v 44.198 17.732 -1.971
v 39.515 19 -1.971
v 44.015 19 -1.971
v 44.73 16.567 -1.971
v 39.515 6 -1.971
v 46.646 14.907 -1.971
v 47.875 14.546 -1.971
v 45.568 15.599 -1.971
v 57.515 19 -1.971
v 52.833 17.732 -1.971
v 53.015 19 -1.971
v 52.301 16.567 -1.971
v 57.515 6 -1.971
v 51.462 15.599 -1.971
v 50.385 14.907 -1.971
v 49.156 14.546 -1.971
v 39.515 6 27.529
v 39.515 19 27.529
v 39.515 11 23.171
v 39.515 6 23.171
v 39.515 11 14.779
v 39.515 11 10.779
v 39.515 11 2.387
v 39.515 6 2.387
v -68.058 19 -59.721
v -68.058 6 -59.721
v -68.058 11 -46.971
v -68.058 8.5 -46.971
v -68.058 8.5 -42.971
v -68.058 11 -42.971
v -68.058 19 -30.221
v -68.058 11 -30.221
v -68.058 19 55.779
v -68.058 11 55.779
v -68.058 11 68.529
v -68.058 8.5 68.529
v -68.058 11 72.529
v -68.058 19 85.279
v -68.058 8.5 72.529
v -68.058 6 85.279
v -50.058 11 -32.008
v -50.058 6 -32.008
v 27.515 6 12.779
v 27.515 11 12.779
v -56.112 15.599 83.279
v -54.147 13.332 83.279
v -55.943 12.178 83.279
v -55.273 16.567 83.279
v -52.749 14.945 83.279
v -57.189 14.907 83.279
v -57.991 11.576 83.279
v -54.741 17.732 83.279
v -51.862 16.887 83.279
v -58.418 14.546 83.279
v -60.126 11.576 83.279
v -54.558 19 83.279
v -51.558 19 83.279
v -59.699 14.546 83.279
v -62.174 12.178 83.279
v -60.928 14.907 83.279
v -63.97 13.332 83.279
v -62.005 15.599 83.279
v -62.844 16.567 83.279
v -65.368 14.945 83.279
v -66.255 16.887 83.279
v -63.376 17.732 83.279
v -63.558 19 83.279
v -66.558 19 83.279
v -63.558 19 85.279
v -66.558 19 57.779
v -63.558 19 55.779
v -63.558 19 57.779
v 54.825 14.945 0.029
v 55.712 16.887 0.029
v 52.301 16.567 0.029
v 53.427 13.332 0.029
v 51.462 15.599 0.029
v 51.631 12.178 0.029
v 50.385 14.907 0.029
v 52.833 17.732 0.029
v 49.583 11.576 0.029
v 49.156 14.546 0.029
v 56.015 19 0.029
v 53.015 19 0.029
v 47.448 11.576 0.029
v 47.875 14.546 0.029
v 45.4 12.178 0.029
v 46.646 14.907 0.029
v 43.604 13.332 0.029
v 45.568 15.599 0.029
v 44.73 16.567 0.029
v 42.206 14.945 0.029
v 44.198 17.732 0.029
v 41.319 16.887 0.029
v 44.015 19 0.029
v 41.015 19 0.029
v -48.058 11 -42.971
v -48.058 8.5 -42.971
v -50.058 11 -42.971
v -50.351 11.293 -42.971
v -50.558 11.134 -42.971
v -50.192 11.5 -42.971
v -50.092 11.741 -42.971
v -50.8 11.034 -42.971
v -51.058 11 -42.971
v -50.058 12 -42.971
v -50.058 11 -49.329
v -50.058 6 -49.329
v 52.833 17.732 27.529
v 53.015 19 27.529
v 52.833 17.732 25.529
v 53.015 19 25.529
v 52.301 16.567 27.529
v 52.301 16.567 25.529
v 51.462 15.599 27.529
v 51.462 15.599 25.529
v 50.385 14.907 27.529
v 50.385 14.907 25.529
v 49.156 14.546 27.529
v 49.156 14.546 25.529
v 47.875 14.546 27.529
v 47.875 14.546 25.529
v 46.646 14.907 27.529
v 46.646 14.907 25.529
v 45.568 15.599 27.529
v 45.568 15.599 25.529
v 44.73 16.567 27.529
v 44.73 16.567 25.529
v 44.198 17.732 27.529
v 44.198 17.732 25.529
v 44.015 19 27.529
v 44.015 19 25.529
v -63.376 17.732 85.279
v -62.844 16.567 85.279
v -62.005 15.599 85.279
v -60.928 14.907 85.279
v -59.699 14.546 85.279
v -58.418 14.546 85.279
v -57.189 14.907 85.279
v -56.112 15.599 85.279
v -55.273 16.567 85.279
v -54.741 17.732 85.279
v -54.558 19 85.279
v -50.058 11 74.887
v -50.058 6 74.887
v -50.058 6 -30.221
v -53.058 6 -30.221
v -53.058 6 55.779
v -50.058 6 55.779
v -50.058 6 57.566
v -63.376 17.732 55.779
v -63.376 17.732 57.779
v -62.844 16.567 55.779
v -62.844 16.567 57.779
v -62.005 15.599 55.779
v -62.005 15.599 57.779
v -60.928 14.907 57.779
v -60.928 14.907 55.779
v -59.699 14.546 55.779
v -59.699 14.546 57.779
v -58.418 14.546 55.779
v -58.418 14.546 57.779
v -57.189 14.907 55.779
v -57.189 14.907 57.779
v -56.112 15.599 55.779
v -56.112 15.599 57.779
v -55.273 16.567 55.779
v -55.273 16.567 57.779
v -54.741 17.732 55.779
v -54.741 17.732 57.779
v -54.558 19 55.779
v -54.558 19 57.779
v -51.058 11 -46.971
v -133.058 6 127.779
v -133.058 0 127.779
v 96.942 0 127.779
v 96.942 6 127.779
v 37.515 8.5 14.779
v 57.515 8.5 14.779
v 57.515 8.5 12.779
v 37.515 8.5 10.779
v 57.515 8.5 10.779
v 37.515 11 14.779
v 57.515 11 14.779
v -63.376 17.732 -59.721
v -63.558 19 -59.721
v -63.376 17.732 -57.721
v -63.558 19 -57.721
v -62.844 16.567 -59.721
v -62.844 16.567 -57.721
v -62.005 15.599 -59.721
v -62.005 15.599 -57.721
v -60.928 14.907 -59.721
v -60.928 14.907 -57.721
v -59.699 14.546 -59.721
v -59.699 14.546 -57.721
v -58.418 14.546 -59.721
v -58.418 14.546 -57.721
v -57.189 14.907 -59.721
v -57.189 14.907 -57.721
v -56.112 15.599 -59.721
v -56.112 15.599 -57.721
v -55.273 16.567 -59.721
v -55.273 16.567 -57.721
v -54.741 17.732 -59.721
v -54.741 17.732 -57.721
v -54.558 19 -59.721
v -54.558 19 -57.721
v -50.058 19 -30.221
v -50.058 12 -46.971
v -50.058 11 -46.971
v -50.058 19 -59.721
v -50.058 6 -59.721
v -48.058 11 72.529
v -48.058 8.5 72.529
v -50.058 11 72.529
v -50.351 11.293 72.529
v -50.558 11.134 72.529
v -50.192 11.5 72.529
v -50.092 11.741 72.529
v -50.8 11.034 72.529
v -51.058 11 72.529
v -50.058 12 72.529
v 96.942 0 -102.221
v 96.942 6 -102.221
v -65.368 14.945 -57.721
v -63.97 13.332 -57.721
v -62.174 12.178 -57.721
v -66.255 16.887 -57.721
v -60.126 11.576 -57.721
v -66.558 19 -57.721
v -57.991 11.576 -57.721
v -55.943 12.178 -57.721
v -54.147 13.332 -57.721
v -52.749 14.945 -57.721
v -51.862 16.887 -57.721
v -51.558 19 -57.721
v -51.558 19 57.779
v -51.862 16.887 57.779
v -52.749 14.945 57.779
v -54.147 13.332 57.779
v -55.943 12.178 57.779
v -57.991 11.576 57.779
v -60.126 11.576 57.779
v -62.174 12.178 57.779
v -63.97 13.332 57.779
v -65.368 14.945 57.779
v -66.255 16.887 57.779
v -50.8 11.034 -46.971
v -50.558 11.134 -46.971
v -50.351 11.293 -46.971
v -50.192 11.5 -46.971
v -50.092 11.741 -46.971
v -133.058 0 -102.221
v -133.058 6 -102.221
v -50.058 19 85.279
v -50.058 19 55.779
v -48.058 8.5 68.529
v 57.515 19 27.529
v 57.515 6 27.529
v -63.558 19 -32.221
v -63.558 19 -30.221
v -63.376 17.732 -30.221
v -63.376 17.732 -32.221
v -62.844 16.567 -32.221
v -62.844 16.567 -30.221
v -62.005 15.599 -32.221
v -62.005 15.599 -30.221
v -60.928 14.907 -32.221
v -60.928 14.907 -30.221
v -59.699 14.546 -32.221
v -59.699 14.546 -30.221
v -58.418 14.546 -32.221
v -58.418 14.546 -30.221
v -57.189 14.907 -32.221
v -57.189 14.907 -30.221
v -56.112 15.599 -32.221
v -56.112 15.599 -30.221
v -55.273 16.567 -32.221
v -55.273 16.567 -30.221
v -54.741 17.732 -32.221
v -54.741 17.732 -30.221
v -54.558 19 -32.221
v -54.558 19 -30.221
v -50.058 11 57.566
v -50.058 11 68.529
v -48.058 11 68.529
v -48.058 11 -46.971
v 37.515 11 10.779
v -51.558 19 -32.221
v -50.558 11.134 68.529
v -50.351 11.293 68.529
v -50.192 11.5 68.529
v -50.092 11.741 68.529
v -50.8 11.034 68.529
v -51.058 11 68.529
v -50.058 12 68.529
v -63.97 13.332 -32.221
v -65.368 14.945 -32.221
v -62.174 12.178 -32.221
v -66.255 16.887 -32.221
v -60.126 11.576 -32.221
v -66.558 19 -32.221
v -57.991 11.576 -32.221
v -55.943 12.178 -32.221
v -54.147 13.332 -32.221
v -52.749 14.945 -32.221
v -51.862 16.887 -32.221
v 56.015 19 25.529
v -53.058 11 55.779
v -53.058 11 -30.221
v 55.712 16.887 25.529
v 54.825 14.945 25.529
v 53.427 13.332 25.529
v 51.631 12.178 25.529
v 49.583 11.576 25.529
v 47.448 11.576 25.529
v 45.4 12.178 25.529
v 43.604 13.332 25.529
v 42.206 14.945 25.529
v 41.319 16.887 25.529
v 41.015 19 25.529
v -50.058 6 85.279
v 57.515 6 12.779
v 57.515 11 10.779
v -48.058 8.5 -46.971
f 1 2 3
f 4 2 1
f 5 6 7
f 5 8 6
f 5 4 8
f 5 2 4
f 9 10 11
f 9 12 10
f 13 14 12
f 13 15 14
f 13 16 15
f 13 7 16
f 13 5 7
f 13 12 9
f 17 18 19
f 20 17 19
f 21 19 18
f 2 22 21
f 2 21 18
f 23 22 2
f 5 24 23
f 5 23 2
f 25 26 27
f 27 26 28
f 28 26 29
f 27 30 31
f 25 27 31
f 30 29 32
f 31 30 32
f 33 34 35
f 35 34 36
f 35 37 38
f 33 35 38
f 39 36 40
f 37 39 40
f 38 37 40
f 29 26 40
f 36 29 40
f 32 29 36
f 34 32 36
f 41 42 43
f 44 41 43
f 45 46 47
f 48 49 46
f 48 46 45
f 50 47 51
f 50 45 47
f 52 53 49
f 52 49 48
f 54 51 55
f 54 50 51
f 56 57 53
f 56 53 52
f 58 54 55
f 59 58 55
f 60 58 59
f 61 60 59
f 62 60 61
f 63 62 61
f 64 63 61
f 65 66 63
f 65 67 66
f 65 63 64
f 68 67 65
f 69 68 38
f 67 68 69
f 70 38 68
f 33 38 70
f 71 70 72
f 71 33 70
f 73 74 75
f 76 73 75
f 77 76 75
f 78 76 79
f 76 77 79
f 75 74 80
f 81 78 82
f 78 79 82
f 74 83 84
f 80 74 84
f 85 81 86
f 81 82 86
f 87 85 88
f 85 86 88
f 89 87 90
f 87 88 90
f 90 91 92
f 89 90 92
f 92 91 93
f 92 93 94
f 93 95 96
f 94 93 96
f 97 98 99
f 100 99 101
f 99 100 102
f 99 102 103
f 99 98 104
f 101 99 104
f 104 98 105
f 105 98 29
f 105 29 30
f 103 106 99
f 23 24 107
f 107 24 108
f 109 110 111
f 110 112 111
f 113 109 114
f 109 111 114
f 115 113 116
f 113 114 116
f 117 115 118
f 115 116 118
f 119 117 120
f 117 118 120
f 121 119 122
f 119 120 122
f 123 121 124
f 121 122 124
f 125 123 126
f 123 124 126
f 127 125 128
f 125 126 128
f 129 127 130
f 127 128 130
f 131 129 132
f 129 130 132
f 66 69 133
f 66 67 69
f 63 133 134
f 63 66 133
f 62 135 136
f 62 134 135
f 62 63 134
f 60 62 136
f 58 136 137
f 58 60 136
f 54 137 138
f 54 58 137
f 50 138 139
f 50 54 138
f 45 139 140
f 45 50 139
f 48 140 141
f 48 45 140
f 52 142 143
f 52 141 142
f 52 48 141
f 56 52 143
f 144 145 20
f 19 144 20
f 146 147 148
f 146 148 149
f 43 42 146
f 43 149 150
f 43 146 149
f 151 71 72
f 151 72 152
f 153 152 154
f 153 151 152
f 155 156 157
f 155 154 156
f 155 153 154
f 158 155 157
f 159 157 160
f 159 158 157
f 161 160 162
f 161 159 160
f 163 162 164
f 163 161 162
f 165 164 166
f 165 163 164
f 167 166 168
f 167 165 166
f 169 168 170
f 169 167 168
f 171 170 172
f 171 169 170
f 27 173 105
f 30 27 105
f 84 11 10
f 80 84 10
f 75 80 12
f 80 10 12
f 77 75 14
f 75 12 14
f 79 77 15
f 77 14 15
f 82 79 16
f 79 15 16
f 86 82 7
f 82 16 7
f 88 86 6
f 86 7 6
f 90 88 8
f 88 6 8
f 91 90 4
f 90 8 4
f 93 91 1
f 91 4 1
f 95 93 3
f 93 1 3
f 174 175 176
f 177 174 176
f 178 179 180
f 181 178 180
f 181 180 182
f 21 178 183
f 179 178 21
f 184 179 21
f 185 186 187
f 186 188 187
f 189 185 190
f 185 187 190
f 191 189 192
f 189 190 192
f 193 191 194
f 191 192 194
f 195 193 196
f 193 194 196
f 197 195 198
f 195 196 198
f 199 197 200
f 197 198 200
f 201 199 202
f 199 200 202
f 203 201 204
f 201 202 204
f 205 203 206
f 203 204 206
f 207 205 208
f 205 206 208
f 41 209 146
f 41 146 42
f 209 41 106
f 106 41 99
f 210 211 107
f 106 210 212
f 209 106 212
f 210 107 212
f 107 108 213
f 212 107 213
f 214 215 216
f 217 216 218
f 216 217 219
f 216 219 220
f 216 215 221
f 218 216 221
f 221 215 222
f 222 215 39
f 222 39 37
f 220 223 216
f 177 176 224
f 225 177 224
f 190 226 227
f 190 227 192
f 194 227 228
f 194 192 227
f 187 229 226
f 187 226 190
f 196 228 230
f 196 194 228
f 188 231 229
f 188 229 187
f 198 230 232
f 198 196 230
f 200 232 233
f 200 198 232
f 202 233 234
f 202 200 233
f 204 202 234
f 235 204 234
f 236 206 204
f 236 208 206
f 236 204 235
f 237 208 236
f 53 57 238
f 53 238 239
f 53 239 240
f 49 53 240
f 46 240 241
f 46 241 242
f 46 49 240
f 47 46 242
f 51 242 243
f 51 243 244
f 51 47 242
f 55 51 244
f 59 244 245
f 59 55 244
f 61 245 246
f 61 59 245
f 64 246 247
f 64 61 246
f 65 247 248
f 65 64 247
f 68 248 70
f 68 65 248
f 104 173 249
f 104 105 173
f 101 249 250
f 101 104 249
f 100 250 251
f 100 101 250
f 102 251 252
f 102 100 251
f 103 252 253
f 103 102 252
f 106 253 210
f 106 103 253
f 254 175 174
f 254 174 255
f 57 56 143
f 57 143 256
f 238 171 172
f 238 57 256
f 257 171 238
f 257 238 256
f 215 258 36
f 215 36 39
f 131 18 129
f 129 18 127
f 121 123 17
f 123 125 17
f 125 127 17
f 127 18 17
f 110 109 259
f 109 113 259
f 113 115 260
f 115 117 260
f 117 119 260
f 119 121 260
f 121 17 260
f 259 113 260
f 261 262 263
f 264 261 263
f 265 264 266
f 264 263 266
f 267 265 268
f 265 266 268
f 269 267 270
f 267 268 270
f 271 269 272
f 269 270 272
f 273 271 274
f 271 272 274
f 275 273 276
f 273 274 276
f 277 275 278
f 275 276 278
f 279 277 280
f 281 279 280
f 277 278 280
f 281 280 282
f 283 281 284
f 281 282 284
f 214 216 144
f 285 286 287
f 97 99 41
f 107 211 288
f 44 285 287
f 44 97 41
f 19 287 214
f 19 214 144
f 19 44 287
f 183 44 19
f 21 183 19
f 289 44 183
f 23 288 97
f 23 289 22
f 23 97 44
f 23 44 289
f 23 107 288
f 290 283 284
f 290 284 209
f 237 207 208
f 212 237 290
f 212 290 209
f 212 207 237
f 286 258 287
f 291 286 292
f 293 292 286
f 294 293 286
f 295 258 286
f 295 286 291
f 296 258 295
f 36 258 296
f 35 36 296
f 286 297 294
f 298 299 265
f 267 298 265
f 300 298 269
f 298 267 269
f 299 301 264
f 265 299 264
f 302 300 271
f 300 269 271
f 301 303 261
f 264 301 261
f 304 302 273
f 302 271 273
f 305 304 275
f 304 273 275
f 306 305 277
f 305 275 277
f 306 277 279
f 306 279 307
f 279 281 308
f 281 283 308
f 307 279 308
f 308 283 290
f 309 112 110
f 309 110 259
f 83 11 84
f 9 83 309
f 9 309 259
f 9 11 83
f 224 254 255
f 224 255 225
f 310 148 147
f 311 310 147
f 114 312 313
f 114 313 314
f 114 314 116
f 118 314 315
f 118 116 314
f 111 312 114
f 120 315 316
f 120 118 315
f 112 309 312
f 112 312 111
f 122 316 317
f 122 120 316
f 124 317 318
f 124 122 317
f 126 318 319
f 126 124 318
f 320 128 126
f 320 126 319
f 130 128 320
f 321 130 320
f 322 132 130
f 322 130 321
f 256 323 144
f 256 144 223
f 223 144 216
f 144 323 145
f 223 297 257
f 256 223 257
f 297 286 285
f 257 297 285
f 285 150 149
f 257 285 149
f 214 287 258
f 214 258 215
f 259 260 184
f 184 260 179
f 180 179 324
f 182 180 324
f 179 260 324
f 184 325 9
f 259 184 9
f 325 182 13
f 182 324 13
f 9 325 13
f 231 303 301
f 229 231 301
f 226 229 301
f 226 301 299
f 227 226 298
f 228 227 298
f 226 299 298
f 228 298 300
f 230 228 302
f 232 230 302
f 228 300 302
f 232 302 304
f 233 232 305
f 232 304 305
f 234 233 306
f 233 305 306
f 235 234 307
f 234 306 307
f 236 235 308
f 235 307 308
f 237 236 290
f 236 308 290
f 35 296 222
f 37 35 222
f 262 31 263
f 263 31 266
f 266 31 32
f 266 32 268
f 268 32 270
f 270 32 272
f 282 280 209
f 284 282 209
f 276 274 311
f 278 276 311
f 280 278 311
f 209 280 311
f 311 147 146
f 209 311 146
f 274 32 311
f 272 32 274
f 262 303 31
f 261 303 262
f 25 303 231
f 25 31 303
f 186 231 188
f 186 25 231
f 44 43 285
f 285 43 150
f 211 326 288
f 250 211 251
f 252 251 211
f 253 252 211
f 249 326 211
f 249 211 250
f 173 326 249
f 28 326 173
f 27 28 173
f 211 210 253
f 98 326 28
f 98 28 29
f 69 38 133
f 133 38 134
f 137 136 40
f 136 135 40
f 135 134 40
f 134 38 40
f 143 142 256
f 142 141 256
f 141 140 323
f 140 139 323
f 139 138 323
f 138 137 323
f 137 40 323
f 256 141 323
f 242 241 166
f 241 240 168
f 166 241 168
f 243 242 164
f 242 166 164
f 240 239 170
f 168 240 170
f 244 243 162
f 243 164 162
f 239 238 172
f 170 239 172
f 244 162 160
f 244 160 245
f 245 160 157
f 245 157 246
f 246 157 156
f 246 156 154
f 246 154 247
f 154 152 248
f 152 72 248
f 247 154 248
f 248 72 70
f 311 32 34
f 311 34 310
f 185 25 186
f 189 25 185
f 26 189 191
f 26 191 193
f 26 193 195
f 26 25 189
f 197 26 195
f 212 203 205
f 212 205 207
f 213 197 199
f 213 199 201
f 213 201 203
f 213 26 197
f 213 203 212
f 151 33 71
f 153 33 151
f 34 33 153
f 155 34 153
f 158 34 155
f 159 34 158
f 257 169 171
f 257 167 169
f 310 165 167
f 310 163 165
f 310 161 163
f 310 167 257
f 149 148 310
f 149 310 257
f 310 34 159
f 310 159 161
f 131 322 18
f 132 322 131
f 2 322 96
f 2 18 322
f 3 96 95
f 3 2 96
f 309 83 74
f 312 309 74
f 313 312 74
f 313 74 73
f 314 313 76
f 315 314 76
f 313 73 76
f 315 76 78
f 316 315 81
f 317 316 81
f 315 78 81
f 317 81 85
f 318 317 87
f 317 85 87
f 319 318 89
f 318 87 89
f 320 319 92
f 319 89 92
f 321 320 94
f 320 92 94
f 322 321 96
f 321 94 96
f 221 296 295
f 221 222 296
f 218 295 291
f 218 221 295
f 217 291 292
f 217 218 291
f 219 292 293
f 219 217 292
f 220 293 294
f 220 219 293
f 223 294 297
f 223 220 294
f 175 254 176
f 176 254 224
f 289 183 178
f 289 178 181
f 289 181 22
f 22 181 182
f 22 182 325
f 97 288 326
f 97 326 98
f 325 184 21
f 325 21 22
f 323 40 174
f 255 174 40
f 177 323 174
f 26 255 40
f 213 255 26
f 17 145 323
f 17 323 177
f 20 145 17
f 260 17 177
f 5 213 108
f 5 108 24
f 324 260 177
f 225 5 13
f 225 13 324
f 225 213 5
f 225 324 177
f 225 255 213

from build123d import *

# Parameters (mm, degrees)
BOTTOM_W                     = 230
BOTTOM_H                     = 230
BOSS_EXTRUDE2_DEPTH          = 6
TRIANGLE_DEPTH               = 5
BOSS_EXTRUDE4_DEPTH          = 8
BOSS_EXTRUDE4_DEPTH_BACK     = 6
SKETCH5_W                    = 18
SKETCH5_H                    = 29.5
ROD_CUTOUT_REACH             = 209.436
SKETCH6_R                    = 4.5
ROD_CUTOUT_DIRECTION_2_REACH = 209.436
LM8SOCKET_START              = -2
SKETCH7_R                    = 7.5
LM8SOCKET_1_DEPTH            = 25.5
LM8SOCKET_START_2            = -27.5
SKETCH8_R                    = 7.5
LM8SOCKET_2_DEPTH            = 25.5
SKETCH9_R                    = 4.5
CUT_EXTRUDE4_DEPTH           = 29.5
CUT_EXTRUDE5_START           = -2
SKETCH11_R                   = 7.5
CUT_EXTRUDE5_DEPTH           = 25.5
SKETCH12_W                   = 4
SKETCH12_H                   = 2.5
CUT_EXTRUDE8_DEPTH           = 20
FILLET1_R                    = 1
FILLET2_R                    = 1
SKETCH13_W                   = 4
SKETCH13_H                   = 2.5
CUT_EXTRUDE9_DEPTH           = 20


with BuildPart() as part:
    # bottom → Boss-Extrude2 (new body)
    with BuildSketch(Plane(origin=(0, 0, 0), x_dir=(1, 0, 0), z_dir=(0, 1, 0))):
        with Locations((-18.058375635, -12.779187817)):
            Rectangle(BOTTOM_W, BOTTOM_H)
    extrude(amount=BOSS_EXTRUDE2_DEPTH)

    # Sketch4 → Triangle (add)
    with BuildSketch(Plane(origin=(0, 6, 0), x_dir=(1, 0, 0), z_dir=(0, 1, 0))):
        Polygon((-68.058375635, 59.720812183), (-68.058375635, -85.279187817), (57.515307914, -12.779187817), align=None)
        Polygon((-53.058375635, -59.298425704), (-53.058375635, 33.740050069), (27.515307914, -12.779187817), align=None, mode=Mode.SUBTRACT)
    extrude(amount=TRIANGLE_DEPTH)

    # Sketch5 → Boss-Extrude4 (add, two sides: drawn at the far end of the back side and taken through both)
    with BuildSketch(Plane(origin=(0, 11, 0), x_dir=(1, 0, 0), z_dir=(0, 1, 0)).offset(-BOSS_EXTRUDE4_DEPTH_BACK)):
        with Locations((-59.058375635, 44.970812183)):
            Rectangle(SKETCH5_W, SKETCH5_H)
        with Locations((-59.058375635, -70.529187817)):
            Rectangle(SKETCH5_W, SKETCH5_H)
        with Locations((48.515307914, -12.779187817)):
            Rectangle(SKETCH5_W, SKETCH5_H)
    extrude(amount=BOSS_EXTRUDE4_DEPTH + BOSS_EXTRUDE4_DEPTH_BACK)

    # Rod cutout: up to this face of the body (flat: up to its plane)
    rod_cutout_end = Plane(part.part.faces().sort_by_distance((-59.058375635, 12.5, -59.720812183))[0])
    # Sketch6 → Rod cutout (cut, up to the picked face)
    with BuildSketch(Plane.XY.offset(-30.220812183), mode=Mode.PRIVATE) as rod_cutout_sk1:
        with Locations((-59.058375635, 19)):
            Circle(SKETCH6_R)
    rod_cutout_tool1 = split(extrude(rod_cutout_sk1.sketch, amount=-ROD_CUTOUT_REACH, mode=Mode.PRIVATE), bisect_by=rod_cutout_end, keep=Keep.BOTH, mode=Mode.PRIVATE)
    add(rod_cutout_tool1.solids().sort_by(Axis((-59.058376, 19, -30.220812), (0, 0, -1)))[0], mode=Mode.SUBTRACT)

    # Rod cutout direction 2: up to this face of the body (flat: up to its plane)
    rod_cutout_direction_2_end = Plane(part.part.faces().sort_by_distance((-59.058375635, 12.5, 85.279187817))[0])
    # Sketch6 → Rod cutout direction 2 (cut, up to the picked face)
    with BuildSketch(Plane.XY.offset(-30.220812183), mode=Mode.PRIVATE) as rod_cutout_direction_2_sk1:
        with Locations((-59.058375635, 19)):
            Circle(SKETCH6_R)
    rod_cutout_direction_2_tool1 = split(extrude(rod_cutout_direction_2_sk1.sketch, amount=ROD_CUTOUT_DIRECTION_2_REACH, mode=Mode.PRIVATE), bisect_by=rod_cutout_direction_2_end, keep=Keep.BOTH, mode=Mode.PRIVATE)
    add(rod_cutout_direction_2_tool1.solids().sort_by(Axis((-59.058376, 19, -30.220812), (0, 0, 1)))[0], mode=Mode.SUBTRACT)

    # Sketch7 → LM8Socket 1 (cut)
    with BuildSketch(Plane.XY.offset(-30.220812183).offset(LM8SOCKET_START)):
        with Locations((-59.058375635, 19)):
            Circle(SKETCH7_R)
    extrude(amount=-LM8SOCKET_1_DEPTH, mode=Mode.SUBTRACT)

    # Sketch8 → LM8Socket 2 (cut)
    with BuildSketch(Plane(origin=(0, 0, 55.779187817), x_dir=(-1, 0, 0), z_dir=(0, 0, -1)).offset(LM8SOCKET_START_2)):
        with Locations((59.058375635, 19)):
            Circle(SKETCH8_R)
    extrude(amount=LM8SOCKET_2_DEPTH, mode=Mode.SUBTRACT)

    # Sketch9 → Cut-Extrude4 (cut)
    with BuildSketch(Plane(origin=(0, 0, -1.970812183), x_dir=(-1, 0, 0), z_dir=(0, 0, -1))):
        with Locations((-48.515307914, 19)):
            Circle(SKETCH9_R)
    extrude(amount=-CUT_EXTRUDE4_DEPTH, mode=Mode.SUBTRACT)

    # Sketch11 → Cut-Extrude5 (cut)
    with BuildSketch(Plane(origin=(0, 0, -1.970812183), x_dir=(-1, 0, 0), z_dir=(0, 0, -1)).offset(CUT_EXTRUDE5_START)):
        with Locations((-48.515307914, 19)):
            Circle(SKETCH11_R)
    extrude(amount=-CUT_EXTRUDE5_DEPTH, mode=Mode.SUBTRACT)

    # Sketch12 → Cut-Extrude8 (cut)
    with BuildSketch(Plane.ZY.offset(68.058375635)):
        with Locations((-44.970812183, 9.75)):
            Rectangle(SKETCH12_W, SKETCH12_H)
        with Locations((70.529187817, 9.75)):
            Rectangle(SKETCH12_W, SKETCH12_H)
    extrude(amount=-CUT_EXTRUDE8_DEPTH, mode=Mode.SUBTRACT)

    # Fillet1
    fillet1_edges = [part.edges().sort_by_distance(p)[0] for p in [
        (-50.058375635, 11, -44.970812183),
    ]]
    fillet(fillet1_edges, radius=FILLET1_R)

    # Fillet2
    fillet2_edges = [part.edges().sort_by_distance(p)[0] for p in [
        (-50.058375635, 11, 70.529187817),
    ]]
    fillet(fillet2_edges, radius=FILLET2_R)

    # Sketch13 → Cut-Extrude9 (cut)
    with BuildSketch(Plane(origin=(57.515307914, 0, 0), x_dir=(0, 0, -1), z_dir=(1, 0, 0))):
        with Locations((-12.779187817, 9.75)):
            Rectangle(SKETCH13_W, SKETCH13_H)
    extrude(amount=-CUT_EXTRUDE9_DEPTH, mode=Mode.SUBTRACT)


solid = part.part
